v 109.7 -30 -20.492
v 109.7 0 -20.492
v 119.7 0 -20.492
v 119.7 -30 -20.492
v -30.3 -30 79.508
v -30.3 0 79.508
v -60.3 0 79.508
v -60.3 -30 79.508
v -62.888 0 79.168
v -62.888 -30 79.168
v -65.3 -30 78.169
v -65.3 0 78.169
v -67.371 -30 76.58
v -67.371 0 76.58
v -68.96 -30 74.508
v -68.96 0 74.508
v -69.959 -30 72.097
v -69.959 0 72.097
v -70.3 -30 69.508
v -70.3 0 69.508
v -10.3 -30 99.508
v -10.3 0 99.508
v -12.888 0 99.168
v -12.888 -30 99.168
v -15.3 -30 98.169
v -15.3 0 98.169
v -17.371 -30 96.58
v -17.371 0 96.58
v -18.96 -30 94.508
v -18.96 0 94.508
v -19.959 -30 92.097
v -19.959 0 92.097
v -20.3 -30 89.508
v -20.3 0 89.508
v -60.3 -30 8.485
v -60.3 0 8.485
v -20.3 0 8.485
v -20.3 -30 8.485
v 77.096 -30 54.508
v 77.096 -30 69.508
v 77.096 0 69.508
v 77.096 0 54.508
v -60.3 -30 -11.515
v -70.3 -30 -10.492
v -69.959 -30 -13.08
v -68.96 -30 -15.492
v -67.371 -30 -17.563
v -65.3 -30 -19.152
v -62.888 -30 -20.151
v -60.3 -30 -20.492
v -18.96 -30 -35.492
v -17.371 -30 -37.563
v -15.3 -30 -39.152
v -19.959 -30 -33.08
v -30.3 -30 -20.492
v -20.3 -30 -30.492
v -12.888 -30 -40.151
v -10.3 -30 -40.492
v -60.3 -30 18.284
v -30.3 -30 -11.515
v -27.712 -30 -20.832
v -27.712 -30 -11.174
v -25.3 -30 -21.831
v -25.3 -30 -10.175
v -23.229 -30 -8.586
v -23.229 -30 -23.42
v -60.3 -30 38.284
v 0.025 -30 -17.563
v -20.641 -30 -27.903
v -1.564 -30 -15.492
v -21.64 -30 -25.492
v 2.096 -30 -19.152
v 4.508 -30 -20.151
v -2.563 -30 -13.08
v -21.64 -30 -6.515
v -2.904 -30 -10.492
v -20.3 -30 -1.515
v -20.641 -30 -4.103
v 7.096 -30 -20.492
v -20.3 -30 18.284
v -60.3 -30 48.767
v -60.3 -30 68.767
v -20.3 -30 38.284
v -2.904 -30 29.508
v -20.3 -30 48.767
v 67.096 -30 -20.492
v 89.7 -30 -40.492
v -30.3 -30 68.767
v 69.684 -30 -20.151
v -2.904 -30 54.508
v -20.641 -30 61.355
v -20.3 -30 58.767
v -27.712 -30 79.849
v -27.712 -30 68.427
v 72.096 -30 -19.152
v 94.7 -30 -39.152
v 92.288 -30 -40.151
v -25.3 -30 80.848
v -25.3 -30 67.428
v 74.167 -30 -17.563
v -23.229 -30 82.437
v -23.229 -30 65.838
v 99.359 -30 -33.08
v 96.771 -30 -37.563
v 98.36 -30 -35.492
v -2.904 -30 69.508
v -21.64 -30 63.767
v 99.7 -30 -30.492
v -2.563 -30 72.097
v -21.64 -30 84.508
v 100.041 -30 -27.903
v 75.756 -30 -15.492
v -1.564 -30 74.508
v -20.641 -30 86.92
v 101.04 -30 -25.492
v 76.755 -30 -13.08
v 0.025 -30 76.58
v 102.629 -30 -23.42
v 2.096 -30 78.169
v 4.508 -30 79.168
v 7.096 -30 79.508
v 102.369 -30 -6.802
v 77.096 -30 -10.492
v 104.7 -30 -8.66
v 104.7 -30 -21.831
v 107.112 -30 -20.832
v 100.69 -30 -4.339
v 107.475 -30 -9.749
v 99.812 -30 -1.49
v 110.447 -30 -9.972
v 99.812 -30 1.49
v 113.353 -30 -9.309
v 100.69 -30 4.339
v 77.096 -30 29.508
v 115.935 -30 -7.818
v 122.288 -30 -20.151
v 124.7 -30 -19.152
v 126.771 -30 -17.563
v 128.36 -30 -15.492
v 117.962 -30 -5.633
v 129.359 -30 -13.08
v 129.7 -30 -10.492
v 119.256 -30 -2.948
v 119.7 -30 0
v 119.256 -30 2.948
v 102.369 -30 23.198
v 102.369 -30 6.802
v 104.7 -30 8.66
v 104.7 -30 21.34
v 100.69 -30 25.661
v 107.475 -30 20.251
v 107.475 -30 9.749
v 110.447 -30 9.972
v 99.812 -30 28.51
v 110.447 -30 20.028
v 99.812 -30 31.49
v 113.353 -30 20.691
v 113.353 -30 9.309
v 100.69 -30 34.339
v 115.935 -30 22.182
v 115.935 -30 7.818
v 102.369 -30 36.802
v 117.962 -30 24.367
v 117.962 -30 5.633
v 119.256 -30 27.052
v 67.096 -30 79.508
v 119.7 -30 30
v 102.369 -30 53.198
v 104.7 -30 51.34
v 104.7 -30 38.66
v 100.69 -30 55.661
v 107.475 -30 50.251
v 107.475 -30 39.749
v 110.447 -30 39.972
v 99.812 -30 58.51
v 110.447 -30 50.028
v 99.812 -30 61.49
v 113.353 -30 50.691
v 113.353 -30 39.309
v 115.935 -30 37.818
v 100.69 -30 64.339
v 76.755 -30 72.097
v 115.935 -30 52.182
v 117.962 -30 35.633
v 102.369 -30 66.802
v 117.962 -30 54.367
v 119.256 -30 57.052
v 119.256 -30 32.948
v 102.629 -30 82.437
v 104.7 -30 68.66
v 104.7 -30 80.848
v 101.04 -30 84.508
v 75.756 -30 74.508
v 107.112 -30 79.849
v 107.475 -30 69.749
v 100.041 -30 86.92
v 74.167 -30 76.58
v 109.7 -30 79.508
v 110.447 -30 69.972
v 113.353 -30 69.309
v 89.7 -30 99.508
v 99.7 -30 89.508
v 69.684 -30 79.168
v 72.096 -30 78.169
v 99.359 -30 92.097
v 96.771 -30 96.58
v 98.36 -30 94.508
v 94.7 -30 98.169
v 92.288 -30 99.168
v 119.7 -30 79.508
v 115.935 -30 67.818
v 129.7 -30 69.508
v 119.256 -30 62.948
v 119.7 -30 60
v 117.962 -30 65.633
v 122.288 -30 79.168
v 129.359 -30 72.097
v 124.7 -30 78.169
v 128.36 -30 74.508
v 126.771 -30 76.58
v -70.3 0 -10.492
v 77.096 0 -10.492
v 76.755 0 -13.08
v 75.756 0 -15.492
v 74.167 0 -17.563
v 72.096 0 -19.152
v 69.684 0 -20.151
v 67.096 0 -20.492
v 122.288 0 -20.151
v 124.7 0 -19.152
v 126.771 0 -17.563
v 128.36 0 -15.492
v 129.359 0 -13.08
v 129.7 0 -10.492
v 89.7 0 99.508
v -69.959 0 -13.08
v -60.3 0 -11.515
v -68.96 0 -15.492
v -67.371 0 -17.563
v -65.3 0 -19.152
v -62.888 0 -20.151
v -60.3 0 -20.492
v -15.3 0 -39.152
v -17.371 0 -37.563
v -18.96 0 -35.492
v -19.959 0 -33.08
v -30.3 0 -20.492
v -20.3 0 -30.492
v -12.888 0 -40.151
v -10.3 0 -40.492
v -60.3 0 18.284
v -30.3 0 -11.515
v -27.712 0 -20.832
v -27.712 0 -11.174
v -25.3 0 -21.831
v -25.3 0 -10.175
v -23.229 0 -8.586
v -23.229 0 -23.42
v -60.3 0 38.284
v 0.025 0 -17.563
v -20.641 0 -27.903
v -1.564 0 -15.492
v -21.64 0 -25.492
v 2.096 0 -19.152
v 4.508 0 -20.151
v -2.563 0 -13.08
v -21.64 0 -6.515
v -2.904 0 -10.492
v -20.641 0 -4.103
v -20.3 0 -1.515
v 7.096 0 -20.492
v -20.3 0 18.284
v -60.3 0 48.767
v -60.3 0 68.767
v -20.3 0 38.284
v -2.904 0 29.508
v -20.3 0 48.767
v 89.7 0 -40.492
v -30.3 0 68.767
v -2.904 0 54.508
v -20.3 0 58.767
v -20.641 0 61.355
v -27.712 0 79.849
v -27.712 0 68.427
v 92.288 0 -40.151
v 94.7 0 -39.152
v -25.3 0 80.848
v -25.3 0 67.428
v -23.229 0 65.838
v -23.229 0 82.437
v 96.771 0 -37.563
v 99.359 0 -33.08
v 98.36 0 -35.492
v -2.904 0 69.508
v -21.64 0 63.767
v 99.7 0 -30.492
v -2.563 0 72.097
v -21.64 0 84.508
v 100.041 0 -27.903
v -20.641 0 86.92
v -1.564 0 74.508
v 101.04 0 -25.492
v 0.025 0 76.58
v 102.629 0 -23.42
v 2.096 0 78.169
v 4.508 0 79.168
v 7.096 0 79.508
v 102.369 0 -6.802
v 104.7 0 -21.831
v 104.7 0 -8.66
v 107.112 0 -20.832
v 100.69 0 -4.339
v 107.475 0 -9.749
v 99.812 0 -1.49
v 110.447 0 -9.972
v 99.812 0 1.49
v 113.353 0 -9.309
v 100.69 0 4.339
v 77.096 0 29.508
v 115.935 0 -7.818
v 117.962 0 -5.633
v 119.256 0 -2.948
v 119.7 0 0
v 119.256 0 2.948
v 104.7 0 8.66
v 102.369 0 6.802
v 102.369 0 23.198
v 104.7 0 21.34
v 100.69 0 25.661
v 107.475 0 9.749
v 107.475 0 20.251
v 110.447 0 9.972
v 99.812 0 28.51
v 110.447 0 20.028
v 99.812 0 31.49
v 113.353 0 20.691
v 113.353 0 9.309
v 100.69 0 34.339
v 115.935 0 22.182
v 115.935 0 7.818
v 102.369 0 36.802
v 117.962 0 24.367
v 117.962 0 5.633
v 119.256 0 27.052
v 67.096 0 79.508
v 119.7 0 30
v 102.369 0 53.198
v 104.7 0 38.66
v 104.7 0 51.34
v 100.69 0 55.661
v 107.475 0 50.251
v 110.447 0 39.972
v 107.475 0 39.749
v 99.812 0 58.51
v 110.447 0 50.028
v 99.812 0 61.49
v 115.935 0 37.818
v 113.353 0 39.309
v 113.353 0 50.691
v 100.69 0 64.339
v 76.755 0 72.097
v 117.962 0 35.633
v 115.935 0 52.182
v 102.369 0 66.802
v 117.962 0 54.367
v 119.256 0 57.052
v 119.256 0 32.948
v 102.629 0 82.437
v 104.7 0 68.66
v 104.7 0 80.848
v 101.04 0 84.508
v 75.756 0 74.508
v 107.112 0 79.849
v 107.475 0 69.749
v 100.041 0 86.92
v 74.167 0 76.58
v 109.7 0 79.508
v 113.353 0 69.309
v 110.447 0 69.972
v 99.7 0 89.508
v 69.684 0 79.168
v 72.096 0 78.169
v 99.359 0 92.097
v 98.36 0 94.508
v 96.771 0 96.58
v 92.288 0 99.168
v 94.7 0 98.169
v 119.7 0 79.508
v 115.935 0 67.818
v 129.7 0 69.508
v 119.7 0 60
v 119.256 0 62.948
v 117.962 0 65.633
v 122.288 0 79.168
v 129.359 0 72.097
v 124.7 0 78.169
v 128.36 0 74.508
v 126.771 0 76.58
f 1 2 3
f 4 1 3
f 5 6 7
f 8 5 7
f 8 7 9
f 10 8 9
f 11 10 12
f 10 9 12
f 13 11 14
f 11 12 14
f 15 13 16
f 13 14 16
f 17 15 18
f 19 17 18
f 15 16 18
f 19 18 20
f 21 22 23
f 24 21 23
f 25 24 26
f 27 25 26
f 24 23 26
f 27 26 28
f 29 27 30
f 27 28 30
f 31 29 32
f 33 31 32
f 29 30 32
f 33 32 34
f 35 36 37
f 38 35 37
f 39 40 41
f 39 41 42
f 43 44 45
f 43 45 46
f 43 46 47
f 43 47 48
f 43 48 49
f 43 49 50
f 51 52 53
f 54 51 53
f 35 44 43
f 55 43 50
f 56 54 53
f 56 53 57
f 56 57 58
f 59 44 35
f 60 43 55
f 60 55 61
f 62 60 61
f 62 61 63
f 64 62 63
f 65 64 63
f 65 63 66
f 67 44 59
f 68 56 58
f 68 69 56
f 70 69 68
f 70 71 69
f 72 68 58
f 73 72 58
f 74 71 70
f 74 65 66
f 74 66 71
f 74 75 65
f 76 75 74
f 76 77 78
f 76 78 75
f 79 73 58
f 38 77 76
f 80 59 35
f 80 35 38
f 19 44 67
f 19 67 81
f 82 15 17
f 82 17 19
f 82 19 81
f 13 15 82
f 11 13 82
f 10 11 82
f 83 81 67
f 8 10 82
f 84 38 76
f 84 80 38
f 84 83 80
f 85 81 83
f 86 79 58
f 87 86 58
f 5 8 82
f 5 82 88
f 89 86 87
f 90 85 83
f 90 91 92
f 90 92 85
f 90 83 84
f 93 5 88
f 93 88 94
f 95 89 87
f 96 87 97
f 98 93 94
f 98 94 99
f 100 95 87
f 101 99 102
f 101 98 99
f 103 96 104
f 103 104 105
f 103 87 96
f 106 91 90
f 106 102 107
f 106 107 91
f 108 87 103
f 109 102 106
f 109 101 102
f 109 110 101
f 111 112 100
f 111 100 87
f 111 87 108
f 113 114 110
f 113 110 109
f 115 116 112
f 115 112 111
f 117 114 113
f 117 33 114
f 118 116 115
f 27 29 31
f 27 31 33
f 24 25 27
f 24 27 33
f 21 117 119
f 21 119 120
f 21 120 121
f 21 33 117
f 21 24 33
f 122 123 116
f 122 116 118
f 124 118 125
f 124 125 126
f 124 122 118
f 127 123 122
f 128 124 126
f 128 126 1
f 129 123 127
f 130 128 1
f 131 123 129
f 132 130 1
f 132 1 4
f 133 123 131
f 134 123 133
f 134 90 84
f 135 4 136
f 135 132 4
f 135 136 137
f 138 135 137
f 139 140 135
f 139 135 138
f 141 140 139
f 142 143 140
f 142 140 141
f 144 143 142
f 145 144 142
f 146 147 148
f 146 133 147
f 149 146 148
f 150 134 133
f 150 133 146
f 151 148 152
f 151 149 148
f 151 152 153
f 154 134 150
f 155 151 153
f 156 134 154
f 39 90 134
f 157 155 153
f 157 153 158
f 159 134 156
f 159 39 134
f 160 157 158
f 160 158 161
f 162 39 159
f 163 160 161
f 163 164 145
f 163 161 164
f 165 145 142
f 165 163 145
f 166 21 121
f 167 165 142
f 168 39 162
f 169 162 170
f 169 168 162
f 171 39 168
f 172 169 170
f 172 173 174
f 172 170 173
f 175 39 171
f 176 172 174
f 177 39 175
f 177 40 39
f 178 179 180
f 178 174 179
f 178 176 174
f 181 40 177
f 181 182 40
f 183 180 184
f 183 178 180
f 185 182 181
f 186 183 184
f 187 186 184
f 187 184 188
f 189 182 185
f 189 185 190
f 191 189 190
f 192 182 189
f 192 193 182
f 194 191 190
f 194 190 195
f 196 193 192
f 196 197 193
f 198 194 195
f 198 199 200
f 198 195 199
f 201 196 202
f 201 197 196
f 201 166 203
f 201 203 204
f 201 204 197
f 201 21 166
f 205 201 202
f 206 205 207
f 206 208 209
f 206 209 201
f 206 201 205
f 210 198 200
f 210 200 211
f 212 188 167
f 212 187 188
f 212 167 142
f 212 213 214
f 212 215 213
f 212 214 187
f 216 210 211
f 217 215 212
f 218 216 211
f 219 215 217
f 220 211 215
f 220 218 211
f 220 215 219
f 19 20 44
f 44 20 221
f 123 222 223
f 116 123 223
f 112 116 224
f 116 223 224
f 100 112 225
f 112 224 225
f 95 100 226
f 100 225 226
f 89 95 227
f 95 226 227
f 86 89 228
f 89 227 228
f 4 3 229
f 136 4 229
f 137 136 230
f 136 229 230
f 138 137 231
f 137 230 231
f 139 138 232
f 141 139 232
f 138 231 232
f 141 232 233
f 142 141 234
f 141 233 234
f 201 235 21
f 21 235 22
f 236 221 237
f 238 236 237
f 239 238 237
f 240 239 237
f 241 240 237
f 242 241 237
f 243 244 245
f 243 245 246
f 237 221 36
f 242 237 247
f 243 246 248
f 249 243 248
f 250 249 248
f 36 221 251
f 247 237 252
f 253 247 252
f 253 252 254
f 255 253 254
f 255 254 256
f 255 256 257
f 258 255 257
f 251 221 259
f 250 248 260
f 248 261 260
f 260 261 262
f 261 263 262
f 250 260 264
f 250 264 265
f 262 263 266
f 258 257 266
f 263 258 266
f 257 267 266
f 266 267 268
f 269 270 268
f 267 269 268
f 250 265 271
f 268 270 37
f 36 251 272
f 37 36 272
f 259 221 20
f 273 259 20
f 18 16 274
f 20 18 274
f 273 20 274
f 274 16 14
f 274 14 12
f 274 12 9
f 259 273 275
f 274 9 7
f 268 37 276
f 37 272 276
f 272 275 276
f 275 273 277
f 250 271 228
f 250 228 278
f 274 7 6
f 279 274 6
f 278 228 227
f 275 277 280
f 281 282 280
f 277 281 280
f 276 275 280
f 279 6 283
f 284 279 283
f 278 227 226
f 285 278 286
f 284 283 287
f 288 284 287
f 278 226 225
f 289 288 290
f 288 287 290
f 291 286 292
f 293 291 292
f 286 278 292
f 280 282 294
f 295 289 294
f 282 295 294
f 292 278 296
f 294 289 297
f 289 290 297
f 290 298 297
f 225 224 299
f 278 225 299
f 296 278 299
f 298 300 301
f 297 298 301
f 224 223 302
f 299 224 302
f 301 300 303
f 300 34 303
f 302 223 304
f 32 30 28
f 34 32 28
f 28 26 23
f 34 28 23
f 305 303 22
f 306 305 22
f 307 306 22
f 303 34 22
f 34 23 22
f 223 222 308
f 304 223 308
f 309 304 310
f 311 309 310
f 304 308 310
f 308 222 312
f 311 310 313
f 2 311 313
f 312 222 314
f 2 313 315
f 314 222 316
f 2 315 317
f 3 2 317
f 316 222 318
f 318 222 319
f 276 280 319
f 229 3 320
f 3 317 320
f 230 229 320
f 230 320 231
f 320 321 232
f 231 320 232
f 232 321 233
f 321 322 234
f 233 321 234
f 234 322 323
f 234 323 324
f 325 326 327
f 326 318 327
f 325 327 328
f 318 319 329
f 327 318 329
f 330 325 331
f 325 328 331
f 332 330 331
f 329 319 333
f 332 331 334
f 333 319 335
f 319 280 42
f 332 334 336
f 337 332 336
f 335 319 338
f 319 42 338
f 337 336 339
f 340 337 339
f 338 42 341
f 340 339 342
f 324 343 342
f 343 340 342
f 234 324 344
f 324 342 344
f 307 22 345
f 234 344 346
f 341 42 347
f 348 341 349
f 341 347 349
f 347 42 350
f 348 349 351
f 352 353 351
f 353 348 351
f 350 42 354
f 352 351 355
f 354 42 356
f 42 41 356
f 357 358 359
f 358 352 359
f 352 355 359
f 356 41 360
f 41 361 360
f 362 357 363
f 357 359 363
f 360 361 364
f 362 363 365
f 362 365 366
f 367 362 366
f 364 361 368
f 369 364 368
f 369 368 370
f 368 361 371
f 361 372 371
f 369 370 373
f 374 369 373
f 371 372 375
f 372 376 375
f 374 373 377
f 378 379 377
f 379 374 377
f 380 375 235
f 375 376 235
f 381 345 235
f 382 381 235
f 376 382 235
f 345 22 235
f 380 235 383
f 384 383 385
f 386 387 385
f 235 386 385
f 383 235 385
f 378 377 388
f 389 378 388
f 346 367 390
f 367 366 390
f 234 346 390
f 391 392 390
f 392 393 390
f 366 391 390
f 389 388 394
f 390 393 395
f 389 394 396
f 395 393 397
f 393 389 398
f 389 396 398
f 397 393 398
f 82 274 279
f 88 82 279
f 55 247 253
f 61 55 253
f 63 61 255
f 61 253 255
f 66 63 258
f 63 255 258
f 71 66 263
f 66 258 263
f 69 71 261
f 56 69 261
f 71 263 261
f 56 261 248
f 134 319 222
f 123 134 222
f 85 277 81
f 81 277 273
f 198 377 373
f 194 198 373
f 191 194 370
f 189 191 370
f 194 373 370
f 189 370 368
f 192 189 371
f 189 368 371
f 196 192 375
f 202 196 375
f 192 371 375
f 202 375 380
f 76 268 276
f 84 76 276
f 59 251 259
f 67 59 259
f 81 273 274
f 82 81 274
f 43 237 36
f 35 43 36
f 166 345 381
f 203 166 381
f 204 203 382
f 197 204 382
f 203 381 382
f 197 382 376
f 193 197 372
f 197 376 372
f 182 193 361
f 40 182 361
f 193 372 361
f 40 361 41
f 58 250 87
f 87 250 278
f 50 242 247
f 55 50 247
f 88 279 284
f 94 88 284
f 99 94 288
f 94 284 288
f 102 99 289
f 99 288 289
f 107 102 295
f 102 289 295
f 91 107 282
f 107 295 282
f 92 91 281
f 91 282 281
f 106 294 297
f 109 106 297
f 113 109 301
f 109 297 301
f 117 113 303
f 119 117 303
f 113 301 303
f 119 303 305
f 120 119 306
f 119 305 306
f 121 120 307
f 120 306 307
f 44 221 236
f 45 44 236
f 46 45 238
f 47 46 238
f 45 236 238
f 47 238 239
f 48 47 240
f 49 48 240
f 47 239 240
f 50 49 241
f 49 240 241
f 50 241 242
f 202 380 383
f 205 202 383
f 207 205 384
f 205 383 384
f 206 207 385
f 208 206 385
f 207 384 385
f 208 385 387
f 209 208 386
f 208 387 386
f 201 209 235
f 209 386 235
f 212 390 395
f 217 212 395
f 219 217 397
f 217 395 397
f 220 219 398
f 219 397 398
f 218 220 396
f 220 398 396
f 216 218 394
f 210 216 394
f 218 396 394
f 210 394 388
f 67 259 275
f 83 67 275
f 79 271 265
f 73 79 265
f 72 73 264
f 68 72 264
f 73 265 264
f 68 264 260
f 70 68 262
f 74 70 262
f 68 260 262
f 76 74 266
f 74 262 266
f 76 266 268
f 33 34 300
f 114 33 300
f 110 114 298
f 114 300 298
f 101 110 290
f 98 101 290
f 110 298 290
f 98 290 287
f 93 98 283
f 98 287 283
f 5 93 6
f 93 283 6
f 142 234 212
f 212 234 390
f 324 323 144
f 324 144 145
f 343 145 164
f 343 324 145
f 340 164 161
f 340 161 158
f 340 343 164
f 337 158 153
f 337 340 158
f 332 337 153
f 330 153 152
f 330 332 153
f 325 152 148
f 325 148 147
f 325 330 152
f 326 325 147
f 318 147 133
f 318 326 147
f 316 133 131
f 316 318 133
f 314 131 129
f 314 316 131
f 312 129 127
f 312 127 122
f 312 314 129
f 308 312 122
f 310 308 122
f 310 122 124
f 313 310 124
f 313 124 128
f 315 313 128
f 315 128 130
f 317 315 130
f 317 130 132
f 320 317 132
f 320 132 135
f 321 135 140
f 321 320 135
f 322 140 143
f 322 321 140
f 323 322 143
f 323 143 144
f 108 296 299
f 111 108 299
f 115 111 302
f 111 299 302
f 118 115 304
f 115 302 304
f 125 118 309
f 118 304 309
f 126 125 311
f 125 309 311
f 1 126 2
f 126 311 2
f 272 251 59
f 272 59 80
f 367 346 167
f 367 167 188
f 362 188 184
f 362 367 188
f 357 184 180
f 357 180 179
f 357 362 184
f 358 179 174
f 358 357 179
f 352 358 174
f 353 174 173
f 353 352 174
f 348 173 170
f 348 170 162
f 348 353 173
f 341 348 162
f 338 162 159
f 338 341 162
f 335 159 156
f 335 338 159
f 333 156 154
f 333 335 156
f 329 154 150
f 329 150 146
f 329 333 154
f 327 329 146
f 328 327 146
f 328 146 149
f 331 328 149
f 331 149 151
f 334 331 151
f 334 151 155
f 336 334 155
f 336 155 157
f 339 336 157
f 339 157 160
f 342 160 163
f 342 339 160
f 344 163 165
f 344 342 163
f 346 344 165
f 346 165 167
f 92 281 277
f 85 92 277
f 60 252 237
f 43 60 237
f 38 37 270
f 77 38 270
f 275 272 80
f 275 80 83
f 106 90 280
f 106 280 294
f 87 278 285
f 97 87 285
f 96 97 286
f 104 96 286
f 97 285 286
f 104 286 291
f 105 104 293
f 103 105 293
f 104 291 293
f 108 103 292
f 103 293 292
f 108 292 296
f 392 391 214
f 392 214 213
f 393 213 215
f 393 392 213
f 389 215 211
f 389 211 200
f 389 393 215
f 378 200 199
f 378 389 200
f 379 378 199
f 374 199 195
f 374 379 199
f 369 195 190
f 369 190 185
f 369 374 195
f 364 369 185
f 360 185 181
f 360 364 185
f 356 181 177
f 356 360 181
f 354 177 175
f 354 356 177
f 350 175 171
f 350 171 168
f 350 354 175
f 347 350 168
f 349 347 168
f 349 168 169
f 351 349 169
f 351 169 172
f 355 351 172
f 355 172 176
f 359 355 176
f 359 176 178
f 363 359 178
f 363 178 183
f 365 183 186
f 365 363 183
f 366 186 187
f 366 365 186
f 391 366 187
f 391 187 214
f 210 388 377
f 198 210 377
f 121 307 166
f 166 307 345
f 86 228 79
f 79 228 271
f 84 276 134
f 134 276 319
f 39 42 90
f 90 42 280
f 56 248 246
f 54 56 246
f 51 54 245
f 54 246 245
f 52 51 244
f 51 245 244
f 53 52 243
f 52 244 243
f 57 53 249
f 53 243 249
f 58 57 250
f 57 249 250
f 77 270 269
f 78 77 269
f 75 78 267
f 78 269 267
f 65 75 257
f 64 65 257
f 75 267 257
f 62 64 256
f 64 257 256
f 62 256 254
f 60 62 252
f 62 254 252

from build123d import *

# Parameters (mm, degrees)
F0_W     = 40
F0_H     = 20
F0_R     = 10
F1_DEPTH = 30
F2_DEPTH = 30


with BuildPart() as f1:
    # F0 (on Front) → F1 (new body)
    with BuildSketch(Plane.XZ):
        with BuildLine():
            ThreePointArc((-20.300006, -30.491507), (-17.371073, -37.562575), (-10.300006, -40.491507))
            Line((-10.300006, -40.491507), (89.699994, -40.491507))
            ThreePointArc((89.699994, -40.491507), (96.771062, -37.562575), (99.699994, -30.491507))
            ThreePointArc((99.699994, -30.491507), (102.628927, -23.420439), (109.699994, -20.491507))
            Line((109.699994, -20.491507), (119.699994, -20.491507))
            ThreePointArc((119.699994, -20.491507), (126.771062, -17.562575), (129.699994, -10.491507))
            Line((129.699994, -10.491507), (129.699994, 69.508493))
            ThreePointArc((129.699994, 69.508493), (126.771062, 76.579561), (119.699994, 79.508493))
            Line((119.699994, 79.508493), (109.699994, 79.508493))
            ThreePointArc((109.699994, 79.508493), (102.628927, 82.437425), (99.699994, 89.508493))
            ThreePointArc((99.699994, 89.508493), (96.771062, 96.579561), (89.699994, 99.508493))
            Line((89.699994, 99.508493), (-10.300006, 99.508493))
            ThreePointArc((-10.300006, 99.508493), (-17.371073, 96.579561), (-20.300006, 89.508493))
            ThreePointArc((-20.300006, 89.508493), (-23.228938, 82.437425), (-30.300006, 79.508493))
            Line((-30.300006, 79.508493), (-60.300006, 79.508493))
            ThreePointArc((-60.300006, 79.508493), (-67.371073, 76.579561), (-70.300006, 69.508493))
            Line((-70.300006, 69.508493), (-70.300006, -10.491507))
            ThreePointArc((-70.300006, -10.491507), (-67.371073, -17.562575), (-60.300006, -20.491507))
            Line((-60.300006, -20.491507), (-30.300006, -20.491507))
            ThreePointArc((-30.300006, -20.491507), (-23.228938, -23.420439), (-20.300006, -30.491507))
        make_face()
        with BuildLine():
            Line((-60.300006, -11.514896), (-60.300006, 8.485104))
            Line((-60.300006, 8.485104), (-20.300006, 8.485104))
            Line((-20.300006, 8.485104), (-20.300006, -1.514896))
            ThreePointArc((-20.300006, -1.514896), (-23.228938, -8.585963), (-30.300006, -11.514896))
            Line((-30.300006, -11.514896), (-60.300006, -11.514896))
        make_face(mode=Mode.SUBTRACT)
        with Locations((-40.300006, 28.283684)):
            Rectangle(F0_W, F0_H, mode=Mode.SUBTRACT)
        with BuildLine():
            Line((67.096237, -20.491507), (7.096237, -20.491507))
            ThreePointArc((7.096237, -20.491507), (0.025169, -17.562575), (-2.903763, -10.491507))
            Line((-2.903763, -10.491507), (-2.903763, 29.508493))
            Line((-2.903763, 29.508493), (77.096237, 29.508493))
            Line((77.096237, 29.508493), (77.096237, -10.491507))
            ThreePointArc((77.096237, -10.491507), (74.167304, -17.562575), (67.096237, -20.491507))
        make_face(mode=Mode.SUBTRACT)
        with Locations((109.699994, 0)):
            Circle(F0_R, mode=Mode.SUBTRACT)
        with BuildLine():
            Line((-60.300006, 48.767287), (-60.300006, 68.767287))
            Line((-60.300006, 68.767287), (-30.300006, 68.767287))
            ThreePointArc((-30.300006, 68.767287), (-23.228938, 65.838355), (-20.300006, 58.767287))
            Line((-20.300006, 58.767287), (-20.300006, 48.767287))
            Line((-20.300006, 48.767287), (-60.300006, 48.767287))
        make_face(mode=Mode.SUBTRACT)
        with Locations((109.699994, 30)):
            Circle(F0_R, mode=Mode.SUBTRACT)
        with Locations((109.699994, 60)):
            Circle(F0_R, mode=Mode.SUBTRACT)
        with BuildLine():
            ThreePointArc((-2.903763, 69.508493), (0.025169, 76.579561), (7.096237, 79.508493))
            Line((7.096237, 79.508493), (67.096237, 79.508493))
            ThreePointArc((67.096237, 79.508493), (74.167304, 76.579561), (77.096237, 69.508493))
            Line((77.096237, 69.508493), (77.096237, 54.508493))
            Line((77.096237, 54.508493), (-2.903763, 54.508493))
            Line((-2.903763, 54.508493), (-2.903763, 69.508493))
        make_face(mode=Mode.SUBTRACT)
    extrude(amount=F1_DEPTH)

    # F0 (on Front) → F2 (join)
    with BuildSketch(Plane.XZ):
        with BuildLine():
            ThreePointArc((-20.300006, -30.491507), (-17.371073, -37.562575), (-10.300006, -40.491507))
            Line((-10.300006, -40.491507), (89.699994, -40.491507))
            ThreePointArc((89.699994, -40.491507), (96.771062, -37.562575), (99.699994, -30.491507))
            ThreePointArc((99.699994, -30.491507), (102.628927, -23.420439), (109.699994, -20.491507))
            Line((109.699994, -20.491507), (119.699994, -20.491507))
            ThreePointArc((119.699994, -20.491507), (126.771062, -17.562575), (129.699994, -10.491507))
            Line((129.699994, -10.491507), (129.699994, 69.508493))
            ThreePointArc((129.699994, 69.508493), (126.771062, 76.579561), (119.699994, 79.508493))
            Line((119.699994, 79.508493), (109.699994, 79.508493))
            ThreePointArc((109.699994, 79.508493), (102.628927, 82.437425), (99.699994, 89.508493))
            ThreePointArc((99.699994, 89.508493), (96.771062, 96.579561), (89.699994, 99.508493))
            Line((89.699994, 99.508493), (-10.300006, 99.508493))
            ThreePointArc((-10.300006, 99.508493), (-17.371073, 96.579561), (-20.300006, 89.508493))
            ThreePointArc((-20.300006, 89.508493), (-23.228938, 82.437425), (-30.300006, 79.508493))
            Line((-30.300006, 79.508493), (-60.300006, 79.508493))
            ThreePointArc((-60.300006, 79.508493), (-67.371073, 76.579561), (-70.300006, 69.508493))
            Line((-70.300006, 69.508493), (-70.300006, -10.491507))
            ThreePointArc((-70.300006, -10.491507), (-67.371073, -17.562575), (-60.300006, -20.491507))
            Line((-60.300006, -20.491507), (-30.300006, -20.491507))
            ThreePointArc((-30.300006, -20.491507), (-23.228938, -23.420439), (-20.300006, -30.491507))
        make_face()
        with BuildLine():
            Line((-60.300006, -11.514896), (-60.300006, 8.485104))
            Line((-60.300006, 8.485104), (-20.300006, 8.485104))
            Line((-20.300006, 8.485104), (-20.300006, -1.514896))
            ThreePointArc((-20.300006, -1.514896), (-23.228938, -8.585963), (-30.300006, -11.514896))
            Line((-30.300006, -11.514896), (-60.300006, -11.514896))
        make_face(mode=Mode.SUBTRACT)
        with Locations((-40.300006, 28.283684)):
            Rectangle(F0_W, F0_H, mode=Mode.SUBTRACT)
        with BuildLine():
            Line((67.096237, -20.491507), (7.096237, -20.491507))
            ThreePointArc((7.096237, -20.491507), (0.025169, -17.562575), (-2.903763, -10.491507))
            Line((-2.903763, -10.491507), (-2.903763, 29.508493))
            Line((-2.903763, 29.508493), (77.096237, 29.508493))
            Line((77.096237, 29.508493), (77.096237, -10.491507))
            ThreePointArc((77.096237, -10.491507), (74.167304, -17.562575), (67.096237, -20.491507))
        make_face(mode=Mode.SUBTRACT)
        with Locations((109.699994, 0)):
            Circle(F0_R, mode=Mode.SUBTRACT)
        with BuildLine():
            Line((-60.300006, 48.767287), (-60.300006, 68.767287))
            Line((-60.300006, 68.767287), (-30.300006, 68.767287))
            ThreePointArc((-30.300006, 68.767287), (-23.228938, 65.838355), (-20.300006, 58.767287))
            Line((-20.300006, 58.767287), (-20.300006, 48.767287))
            Line((-20.300006, 48.767287), (-60.300006, 48.767287))
        make_face(mode=Mode.SUBTRACT)
        with Locations((109.699994, 30)):
            Circle(F0_R, mode=Mode.SUBTRACT)
        with Locations((109.699994, 60)):
            Circle(F0_R, mode=Mode.SUBTRACT)
        with BuildLine():
            ThreePointArc((-2.903763, 69.508493), (0.025169, 76.579561), (7.096237, 79.508493))
            Line((7.096237, 79.508493), (67.096237, 79.508493))
            ThreePointArc((67.096237, 79.508493), (74.167304, 76.579561), (77.096237, 69.508493))
            Line((77.096237, 69.508493), (77.096237, 54.508493))
            Line((77.096237, 54.508493), (-2.903763, 54.508493))
            Line((-2.903763, 54.508493), (-2.903763, 69.508493))
        make_face(mode=Mode.SUBTRACT)
    extrude(amount=F2_DEPTH)


solid = f1.part
